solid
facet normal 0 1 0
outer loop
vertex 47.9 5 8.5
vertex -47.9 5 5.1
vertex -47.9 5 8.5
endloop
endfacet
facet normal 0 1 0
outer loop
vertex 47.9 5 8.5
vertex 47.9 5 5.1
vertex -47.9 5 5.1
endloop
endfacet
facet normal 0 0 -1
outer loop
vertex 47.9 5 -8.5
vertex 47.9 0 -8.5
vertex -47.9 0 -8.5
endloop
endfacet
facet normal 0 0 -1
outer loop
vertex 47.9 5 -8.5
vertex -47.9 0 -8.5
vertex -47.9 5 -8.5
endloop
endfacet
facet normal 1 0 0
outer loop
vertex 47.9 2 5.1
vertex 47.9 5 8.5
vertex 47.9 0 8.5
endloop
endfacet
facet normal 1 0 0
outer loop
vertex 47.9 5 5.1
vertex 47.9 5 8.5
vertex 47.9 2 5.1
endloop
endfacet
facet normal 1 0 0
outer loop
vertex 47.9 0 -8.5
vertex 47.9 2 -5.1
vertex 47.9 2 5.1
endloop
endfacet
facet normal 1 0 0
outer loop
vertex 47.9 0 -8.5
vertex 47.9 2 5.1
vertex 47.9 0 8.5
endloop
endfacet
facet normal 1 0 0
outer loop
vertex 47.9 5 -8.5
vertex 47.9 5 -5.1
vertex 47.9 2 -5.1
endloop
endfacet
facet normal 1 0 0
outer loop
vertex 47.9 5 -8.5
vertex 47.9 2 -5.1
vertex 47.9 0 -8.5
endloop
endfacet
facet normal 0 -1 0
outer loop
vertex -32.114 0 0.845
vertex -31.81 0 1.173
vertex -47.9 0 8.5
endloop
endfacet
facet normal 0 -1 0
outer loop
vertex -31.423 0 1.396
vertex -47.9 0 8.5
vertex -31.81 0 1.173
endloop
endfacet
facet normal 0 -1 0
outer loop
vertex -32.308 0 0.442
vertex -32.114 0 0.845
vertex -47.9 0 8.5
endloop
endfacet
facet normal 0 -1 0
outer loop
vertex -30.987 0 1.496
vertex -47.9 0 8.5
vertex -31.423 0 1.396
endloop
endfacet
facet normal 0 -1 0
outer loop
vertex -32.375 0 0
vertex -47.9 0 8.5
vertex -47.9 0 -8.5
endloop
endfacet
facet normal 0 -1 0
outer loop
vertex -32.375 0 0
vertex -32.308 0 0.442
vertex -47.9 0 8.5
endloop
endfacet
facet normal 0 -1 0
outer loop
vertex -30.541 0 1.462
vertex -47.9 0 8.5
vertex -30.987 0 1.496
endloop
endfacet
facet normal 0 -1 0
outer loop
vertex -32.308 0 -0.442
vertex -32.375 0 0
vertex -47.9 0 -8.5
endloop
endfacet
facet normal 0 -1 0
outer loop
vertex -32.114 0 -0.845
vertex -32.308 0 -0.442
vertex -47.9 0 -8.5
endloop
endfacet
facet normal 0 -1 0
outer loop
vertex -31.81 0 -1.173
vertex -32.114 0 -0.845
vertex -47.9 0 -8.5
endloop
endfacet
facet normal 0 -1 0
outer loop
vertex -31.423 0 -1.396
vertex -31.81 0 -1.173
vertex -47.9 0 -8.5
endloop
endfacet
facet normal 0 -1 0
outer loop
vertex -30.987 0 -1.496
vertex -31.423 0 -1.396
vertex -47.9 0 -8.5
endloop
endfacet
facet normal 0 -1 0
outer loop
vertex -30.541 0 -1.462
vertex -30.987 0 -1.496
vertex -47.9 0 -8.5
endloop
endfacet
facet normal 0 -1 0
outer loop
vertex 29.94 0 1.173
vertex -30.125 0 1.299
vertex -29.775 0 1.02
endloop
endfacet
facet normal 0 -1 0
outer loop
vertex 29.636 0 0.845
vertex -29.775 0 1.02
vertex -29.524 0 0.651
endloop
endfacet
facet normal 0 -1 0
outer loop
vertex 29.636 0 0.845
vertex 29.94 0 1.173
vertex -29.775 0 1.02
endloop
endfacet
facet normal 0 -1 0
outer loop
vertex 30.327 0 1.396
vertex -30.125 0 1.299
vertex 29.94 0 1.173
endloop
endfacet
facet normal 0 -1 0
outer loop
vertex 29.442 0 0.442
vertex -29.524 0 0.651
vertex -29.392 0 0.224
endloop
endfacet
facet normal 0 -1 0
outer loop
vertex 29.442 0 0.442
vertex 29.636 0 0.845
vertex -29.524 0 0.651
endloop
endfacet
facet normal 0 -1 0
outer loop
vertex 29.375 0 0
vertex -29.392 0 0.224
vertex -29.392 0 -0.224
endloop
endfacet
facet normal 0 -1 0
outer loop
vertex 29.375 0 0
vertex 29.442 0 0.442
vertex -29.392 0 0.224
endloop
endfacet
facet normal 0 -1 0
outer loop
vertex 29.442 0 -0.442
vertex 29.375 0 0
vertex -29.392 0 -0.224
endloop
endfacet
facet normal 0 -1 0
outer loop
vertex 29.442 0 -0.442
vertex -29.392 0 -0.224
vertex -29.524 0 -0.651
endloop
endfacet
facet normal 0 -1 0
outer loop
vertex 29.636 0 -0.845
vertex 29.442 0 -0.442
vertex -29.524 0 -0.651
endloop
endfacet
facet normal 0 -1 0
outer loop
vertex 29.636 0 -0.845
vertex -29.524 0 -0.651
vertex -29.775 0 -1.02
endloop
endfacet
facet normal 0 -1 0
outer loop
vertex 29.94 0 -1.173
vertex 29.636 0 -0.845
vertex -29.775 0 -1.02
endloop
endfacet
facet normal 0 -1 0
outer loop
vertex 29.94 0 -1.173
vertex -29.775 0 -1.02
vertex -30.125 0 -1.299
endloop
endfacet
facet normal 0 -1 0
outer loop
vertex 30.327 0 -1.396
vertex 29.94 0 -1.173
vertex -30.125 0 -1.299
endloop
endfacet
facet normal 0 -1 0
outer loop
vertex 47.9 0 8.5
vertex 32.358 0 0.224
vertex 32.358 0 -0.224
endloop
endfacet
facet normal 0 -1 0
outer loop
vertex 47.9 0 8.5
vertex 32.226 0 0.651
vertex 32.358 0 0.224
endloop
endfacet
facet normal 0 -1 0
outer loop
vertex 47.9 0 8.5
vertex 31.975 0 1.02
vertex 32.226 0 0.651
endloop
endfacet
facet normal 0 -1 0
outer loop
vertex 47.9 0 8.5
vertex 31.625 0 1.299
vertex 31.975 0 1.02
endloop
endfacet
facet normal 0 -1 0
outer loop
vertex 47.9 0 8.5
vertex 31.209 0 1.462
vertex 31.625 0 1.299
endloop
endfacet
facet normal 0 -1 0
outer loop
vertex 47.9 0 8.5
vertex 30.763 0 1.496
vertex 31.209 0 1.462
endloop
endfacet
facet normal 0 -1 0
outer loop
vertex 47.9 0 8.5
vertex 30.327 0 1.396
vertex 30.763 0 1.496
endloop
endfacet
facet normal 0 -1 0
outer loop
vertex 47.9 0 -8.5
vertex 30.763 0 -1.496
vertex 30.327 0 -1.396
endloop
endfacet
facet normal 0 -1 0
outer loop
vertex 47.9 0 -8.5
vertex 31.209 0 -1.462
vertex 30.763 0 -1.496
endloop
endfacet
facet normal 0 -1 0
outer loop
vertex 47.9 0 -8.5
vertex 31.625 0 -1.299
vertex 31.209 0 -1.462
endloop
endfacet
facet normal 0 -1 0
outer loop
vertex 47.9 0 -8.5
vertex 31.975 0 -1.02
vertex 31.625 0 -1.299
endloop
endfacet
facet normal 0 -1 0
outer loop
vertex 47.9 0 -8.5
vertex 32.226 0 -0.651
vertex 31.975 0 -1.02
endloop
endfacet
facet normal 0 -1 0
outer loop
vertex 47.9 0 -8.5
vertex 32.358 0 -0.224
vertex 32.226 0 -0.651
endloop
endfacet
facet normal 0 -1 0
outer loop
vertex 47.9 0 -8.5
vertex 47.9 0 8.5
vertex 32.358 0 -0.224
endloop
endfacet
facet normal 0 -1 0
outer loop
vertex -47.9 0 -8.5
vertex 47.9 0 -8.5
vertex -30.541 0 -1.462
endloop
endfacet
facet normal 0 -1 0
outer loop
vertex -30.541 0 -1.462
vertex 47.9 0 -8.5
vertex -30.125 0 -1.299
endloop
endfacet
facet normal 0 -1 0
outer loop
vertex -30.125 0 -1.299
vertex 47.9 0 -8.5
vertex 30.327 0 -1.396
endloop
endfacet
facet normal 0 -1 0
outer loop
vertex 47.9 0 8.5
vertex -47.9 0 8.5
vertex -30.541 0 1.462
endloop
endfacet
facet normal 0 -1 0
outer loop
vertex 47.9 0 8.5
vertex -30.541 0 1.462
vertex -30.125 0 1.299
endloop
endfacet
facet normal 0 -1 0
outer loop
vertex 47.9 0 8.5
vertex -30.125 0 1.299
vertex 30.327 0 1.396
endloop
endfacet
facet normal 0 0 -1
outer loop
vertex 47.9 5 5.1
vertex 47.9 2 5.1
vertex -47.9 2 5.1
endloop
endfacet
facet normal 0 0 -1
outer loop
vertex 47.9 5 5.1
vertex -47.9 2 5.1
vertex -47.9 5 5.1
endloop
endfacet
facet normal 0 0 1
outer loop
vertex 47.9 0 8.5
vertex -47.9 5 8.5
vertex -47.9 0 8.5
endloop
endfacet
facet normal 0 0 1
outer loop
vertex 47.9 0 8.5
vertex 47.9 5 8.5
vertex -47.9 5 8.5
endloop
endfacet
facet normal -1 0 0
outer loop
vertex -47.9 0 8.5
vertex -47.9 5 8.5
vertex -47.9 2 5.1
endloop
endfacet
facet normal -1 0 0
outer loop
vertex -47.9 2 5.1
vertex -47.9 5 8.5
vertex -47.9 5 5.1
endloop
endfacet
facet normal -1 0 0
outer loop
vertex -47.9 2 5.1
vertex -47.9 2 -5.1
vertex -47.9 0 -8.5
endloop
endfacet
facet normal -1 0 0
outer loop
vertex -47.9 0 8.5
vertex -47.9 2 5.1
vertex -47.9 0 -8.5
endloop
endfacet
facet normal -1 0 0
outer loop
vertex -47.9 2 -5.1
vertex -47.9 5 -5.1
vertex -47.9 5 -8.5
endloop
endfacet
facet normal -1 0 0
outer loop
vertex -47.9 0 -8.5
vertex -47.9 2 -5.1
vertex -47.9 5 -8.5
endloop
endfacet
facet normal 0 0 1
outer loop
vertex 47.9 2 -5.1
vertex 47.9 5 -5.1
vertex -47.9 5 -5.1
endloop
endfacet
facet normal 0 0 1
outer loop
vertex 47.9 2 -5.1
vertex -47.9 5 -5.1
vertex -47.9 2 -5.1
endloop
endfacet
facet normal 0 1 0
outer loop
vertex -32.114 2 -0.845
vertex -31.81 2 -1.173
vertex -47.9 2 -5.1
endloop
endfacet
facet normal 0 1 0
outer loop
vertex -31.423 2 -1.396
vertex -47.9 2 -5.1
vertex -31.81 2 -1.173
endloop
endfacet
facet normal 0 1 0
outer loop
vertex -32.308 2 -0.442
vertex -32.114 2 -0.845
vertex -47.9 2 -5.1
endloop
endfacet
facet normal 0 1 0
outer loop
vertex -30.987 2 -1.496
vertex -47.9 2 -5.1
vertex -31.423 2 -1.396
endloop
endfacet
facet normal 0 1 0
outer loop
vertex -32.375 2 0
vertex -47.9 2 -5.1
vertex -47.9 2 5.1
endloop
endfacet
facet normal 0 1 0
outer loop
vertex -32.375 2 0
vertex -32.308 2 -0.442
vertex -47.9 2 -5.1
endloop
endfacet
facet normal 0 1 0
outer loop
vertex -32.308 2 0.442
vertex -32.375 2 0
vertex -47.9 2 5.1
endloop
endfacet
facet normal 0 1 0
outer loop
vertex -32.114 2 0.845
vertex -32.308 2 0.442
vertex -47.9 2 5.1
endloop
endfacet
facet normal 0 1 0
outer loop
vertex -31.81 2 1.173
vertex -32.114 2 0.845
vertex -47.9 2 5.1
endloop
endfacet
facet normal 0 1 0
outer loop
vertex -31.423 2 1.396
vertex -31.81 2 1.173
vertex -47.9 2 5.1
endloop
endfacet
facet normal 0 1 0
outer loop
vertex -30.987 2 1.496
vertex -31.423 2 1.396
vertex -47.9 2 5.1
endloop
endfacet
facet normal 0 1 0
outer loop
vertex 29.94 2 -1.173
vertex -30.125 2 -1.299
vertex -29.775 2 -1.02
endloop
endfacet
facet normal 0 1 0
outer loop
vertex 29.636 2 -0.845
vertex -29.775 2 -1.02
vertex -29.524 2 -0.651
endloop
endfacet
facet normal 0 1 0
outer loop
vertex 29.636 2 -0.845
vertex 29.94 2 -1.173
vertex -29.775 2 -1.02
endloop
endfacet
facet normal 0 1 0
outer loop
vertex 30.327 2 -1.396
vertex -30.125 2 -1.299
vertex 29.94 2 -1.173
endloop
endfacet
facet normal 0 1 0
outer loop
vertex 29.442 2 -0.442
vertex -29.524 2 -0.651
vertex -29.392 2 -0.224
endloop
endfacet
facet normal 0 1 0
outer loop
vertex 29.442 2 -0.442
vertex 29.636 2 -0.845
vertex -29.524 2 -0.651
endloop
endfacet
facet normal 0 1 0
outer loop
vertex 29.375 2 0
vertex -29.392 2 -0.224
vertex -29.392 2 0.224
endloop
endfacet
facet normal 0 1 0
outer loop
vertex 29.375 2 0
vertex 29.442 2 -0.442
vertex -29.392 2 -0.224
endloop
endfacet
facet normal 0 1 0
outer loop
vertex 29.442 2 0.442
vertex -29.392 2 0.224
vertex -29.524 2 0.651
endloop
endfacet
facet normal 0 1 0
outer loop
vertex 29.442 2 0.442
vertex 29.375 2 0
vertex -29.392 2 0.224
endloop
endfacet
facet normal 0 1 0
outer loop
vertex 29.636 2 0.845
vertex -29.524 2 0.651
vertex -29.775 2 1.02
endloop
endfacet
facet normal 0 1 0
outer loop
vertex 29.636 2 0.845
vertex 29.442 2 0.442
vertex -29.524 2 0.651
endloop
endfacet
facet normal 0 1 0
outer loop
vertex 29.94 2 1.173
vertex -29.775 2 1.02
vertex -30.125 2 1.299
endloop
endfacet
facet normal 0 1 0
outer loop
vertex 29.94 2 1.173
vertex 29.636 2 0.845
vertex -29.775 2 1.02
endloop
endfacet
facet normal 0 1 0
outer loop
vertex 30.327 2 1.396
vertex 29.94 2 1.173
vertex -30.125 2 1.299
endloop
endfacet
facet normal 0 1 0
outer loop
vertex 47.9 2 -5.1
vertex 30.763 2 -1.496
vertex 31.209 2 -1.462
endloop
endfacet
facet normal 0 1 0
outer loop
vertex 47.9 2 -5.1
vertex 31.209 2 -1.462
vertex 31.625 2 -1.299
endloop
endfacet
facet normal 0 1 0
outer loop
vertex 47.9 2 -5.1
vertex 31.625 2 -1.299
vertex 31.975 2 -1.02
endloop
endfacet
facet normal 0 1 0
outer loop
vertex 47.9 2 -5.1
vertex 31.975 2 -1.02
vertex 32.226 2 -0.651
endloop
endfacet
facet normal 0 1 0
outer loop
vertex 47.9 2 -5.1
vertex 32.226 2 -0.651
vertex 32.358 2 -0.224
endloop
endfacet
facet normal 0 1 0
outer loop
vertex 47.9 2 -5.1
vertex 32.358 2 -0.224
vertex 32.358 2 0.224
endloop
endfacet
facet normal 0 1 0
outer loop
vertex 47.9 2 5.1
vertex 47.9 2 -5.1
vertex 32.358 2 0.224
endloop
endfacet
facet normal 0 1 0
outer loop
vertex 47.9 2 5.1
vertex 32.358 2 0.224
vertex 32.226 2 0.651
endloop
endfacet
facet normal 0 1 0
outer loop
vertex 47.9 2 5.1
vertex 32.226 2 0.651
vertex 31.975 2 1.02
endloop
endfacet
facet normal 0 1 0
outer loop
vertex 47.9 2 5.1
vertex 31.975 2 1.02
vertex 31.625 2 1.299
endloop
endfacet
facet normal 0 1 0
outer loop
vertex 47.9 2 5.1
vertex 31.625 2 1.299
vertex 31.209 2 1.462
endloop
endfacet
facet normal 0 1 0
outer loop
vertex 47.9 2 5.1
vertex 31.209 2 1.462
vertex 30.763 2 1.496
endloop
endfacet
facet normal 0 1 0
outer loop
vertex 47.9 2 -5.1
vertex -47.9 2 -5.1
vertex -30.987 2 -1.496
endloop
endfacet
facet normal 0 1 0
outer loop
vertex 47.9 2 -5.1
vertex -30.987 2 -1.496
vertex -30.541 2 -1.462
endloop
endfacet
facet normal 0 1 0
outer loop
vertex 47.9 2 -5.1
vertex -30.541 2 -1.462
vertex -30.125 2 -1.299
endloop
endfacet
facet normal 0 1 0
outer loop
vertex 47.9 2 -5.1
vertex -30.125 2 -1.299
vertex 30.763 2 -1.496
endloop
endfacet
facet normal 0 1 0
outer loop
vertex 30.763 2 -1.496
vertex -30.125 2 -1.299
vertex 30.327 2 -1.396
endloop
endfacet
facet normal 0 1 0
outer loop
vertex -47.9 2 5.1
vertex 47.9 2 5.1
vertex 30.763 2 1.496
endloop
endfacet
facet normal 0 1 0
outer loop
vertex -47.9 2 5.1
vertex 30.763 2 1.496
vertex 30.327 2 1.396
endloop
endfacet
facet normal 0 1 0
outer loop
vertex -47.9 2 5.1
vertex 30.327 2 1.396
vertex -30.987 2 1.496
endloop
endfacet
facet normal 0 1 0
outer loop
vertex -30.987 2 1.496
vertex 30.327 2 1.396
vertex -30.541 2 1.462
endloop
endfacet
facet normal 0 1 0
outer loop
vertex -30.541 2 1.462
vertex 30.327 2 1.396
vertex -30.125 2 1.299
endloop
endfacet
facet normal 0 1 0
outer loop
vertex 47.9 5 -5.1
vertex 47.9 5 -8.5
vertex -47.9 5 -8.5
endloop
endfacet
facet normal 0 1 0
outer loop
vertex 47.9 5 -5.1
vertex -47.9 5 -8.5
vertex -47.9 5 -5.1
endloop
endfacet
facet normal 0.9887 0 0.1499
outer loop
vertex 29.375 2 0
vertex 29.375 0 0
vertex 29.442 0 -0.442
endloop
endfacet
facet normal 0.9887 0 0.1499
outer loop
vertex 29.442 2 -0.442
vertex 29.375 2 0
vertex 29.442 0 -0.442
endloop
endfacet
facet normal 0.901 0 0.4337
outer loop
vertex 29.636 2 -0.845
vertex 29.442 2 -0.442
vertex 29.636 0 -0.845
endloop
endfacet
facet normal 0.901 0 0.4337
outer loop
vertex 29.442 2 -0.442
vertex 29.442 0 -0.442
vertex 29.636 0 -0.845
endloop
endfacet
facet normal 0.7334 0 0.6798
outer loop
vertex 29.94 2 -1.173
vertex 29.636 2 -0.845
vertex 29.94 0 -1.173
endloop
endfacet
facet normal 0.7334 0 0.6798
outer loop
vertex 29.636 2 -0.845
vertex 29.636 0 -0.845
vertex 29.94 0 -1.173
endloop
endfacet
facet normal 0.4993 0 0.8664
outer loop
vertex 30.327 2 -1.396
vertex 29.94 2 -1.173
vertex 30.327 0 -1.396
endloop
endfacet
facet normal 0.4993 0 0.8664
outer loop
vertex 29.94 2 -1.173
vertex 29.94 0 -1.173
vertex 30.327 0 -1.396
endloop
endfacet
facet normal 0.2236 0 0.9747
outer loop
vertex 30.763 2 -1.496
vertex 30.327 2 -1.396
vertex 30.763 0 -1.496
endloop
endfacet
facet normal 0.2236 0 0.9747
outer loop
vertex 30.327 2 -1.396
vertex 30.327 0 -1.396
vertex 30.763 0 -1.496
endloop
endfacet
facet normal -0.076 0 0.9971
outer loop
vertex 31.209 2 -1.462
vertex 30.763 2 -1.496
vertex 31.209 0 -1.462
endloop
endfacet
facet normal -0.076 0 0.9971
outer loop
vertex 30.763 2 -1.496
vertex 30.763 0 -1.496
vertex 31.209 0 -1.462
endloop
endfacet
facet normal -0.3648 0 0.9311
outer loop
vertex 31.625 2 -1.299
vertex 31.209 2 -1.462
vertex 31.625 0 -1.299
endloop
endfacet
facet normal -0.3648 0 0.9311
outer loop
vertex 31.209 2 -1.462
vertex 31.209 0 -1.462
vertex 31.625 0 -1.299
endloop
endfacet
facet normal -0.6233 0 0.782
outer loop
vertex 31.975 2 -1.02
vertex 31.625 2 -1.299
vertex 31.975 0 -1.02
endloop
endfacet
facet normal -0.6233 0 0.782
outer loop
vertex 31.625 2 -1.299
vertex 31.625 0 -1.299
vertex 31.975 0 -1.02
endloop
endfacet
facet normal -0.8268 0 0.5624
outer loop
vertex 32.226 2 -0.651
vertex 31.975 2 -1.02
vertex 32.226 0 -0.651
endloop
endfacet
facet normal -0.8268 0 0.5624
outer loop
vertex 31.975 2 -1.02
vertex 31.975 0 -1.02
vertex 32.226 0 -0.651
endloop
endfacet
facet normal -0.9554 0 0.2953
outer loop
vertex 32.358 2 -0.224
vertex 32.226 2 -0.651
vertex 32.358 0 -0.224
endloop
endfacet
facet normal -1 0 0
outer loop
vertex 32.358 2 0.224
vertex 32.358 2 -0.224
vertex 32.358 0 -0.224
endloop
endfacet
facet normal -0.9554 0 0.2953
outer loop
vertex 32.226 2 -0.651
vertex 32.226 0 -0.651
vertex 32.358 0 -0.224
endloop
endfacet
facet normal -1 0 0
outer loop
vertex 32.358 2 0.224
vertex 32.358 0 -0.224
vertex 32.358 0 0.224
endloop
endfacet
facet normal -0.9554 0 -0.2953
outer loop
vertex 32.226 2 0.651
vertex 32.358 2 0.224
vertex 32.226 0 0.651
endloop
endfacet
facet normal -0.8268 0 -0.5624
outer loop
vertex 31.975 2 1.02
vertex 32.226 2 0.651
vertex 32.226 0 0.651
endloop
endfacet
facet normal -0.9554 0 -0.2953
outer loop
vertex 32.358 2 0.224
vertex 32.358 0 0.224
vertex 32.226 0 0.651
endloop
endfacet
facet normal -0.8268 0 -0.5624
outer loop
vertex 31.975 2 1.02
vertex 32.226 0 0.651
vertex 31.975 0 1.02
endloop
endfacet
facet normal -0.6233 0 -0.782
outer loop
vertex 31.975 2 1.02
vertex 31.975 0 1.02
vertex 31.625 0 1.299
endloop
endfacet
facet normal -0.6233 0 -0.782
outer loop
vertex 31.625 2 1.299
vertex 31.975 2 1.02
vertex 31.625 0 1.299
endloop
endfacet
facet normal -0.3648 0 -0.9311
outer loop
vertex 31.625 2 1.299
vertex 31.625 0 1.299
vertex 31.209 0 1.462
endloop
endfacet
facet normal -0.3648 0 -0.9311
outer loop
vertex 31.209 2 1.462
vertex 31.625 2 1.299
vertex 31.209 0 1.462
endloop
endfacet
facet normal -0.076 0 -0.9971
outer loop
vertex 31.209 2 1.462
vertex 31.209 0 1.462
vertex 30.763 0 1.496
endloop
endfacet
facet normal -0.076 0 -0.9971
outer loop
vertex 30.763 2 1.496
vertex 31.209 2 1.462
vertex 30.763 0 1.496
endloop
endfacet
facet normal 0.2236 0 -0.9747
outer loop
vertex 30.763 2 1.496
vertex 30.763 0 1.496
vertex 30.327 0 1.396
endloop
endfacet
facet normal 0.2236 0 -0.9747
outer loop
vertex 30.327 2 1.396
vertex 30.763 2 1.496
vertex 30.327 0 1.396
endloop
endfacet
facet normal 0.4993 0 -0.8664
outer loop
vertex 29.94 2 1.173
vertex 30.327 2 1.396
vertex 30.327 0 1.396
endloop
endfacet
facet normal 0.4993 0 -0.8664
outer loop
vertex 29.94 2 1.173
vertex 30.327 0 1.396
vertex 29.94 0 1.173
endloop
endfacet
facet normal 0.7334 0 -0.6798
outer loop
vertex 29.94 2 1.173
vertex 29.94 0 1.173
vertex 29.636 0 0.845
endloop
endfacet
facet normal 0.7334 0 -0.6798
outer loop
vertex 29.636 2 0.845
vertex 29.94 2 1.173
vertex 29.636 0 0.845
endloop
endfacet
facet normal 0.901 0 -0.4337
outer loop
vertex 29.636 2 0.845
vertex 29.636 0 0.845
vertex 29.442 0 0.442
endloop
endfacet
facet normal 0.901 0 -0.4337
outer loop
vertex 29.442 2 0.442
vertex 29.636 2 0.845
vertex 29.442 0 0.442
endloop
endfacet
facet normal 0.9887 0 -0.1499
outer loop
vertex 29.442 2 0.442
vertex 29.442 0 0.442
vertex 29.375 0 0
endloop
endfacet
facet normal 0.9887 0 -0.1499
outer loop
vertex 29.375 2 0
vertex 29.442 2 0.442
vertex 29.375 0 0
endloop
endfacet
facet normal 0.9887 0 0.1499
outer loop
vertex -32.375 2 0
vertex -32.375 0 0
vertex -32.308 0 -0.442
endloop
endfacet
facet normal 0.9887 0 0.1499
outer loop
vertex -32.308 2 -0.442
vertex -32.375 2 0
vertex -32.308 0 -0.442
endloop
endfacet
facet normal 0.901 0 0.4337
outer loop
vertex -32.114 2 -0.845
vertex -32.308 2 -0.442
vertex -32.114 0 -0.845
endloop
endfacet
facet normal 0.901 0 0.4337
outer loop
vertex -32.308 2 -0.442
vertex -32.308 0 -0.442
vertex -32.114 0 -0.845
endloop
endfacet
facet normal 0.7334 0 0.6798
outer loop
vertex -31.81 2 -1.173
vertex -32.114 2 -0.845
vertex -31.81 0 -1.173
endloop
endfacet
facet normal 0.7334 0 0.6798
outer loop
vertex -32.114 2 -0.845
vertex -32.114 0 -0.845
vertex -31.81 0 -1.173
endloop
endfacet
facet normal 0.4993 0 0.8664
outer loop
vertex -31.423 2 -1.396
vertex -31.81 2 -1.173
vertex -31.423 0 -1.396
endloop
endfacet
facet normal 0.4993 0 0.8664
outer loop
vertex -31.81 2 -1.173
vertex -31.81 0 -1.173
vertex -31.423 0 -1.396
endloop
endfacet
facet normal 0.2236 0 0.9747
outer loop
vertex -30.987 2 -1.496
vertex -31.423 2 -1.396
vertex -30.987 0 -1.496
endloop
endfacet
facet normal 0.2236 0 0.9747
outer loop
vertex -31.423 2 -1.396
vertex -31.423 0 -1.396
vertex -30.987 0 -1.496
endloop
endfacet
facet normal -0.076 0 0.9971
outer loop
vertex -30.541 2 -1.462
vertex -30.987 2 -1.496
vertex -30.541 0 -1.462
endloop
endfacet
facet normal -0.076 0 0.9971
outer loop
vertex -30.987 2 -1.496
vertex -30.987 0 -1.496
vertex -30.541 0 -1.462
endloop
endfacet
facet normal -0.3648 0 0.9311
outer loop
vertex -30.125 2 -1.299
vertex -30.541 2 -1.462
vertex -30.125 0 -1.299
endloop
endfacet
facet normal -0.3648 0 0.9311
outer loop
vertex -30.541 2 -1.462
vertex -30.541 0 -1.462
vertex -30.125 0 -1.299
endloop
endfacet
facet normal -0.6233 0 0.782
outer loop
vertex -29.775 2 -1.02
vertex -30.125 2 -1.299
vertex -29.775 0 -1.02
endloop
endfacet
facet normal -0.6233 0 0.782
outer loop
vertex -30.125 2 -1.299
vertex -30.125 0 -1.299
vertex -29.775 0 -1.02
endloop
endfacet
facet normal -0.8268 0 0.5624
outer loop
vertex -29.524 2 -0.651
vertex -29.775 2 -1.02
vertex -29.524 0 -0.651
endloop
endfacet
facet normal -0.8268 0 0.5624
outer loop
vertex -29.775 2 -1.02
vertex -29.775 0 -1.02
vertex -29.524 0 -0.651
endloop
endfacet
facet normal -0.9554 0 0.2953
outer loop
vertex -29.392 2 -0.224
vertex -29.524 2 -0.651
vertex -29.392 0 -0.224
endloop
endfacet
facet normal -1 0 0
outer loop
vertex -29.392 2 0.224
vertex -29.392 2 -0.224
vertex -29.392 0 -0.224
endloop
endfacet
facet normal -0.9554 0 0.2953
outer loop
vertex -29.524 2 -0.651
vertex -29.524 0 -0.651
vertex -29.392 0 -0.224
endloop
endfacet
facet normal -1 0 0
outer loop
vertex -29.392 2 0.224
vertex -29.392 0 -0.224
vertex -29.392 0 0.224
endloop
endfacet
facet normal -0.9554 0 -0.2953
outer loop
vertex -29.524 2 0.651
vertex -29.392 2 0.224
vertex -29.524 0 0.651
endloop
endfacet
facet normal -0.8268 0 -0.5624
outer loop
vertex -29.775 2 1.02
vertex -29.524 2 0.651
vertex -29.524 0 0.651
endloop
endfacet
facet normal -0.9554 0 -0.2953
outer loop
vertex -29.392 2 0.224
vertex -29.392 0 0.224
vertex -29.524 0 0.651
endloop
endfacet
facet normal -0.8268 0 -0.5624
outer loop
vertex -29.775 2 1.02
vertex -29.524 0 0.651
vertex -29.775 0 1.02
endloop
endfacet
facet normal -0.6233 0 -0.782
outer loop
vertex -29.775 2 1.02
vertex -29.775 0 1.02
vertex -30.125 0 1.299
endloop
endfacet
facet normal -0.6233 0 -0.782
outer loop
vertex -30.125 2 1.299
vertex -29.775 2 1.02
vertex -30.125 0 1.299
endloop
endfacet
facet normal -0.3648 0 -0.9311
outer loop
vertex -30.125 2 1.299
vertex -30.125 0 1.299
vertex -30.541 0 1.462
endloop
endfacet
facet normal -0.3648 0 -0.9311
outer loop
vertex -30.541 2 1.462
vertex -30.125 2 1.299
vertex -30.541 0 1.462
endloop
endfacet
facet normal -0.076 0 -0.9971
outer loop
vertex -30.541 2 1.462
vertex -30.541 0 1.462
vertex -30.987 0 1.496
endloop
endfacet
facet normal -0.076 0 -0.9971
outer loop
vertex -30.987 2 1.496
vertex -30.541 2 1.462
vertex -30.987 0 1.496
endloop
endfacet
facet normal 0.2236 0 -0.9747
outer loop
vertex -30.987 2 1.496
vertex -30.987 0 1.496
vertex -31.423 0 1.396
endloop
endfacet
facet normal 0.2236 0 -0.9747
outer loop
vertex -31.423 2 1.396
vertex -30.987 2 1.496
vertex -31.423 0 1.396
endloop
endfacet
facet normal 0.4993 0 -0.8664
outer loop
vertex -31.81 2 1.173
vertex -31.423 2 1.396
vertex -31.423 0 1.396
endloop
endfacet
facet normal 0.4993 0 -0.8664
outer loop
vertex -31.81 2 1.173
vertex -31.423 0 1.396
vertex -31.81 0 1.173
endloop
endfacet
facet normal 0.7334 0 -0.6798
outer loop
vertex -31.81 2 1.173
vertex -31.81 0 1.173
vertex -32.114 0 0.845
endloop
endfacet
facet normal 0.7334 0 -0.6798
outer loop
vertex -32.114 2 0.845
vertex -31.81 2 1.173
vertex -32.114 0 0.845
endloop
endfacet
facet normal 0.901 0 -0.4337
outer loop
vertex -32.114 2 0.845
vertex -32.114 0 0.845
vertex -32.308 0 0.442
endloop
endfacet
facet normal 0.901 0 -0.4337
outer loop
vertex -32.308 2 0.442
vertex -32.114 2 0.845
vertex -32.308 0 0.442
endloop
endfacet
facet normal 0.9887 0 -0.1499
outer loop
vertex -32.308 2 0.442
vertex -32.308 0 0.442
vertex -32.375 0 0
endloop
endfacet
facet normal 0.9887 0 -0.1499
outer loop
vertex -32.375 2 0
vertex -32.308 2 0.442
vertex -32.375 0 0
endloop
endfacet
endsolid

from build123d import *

# Parameters (mm, degrees)
BOSS_EXTRUDE1_DEPTH       = 47.9
F_3_0MM_DOWEL_HOLE1_D     = 3
F_3_0MM_DOWEL_HOLE1_DEPTH = 8.5
F_3_0MM_DOWEL_HOLE1_TIP   = 0.901290929


with BuildPart() as part:
    # Sketch1 → Boss-Extrude1 (new body, symmetric)
    with BuildSketch(Plane(origin=(0, 0, 0), x_dir=(0, 0, -1), z_dir=(1, 0, 0))):
        Polygon((-8.5, 0), (8.5, 0), (8.5, 5), (5.1, 5), (5.1, 2), (-5.1, 2), (-5.1, 5), (-8.5, 5), align=None)
    extrude(amount=BOSS_EXTRUDE1_DEPTH, both=True)

    # Ø3.0mm Dowel Hole1
    with Locations(Plane(origin=(0, 2, 0), x_dir=(1, 0, 0), z_dir=(0, 1, 0))):
        with Locations((-30.875, 0), (30.875, 0)):
            Hole(F_3_0MM_DOWEL_HOLE1_D / 2, depth=F_3_0MM_DOWEL_HOLE1_DEPTH)
            with Locations((0, 0, -(F_3_0MM_DOWEL_HOLE1_DEPTH + F_3_0MM_DOWEL_HOLE1_TIP / 2))):  # 118° drill point
                Cone(0, F_3_0MM_DOWEL_HOLE1_D / 2, F_3_0MM_DOWEL_HOLE1_TIP, mode=Mode.SUBTRACT)


solid = part.part
